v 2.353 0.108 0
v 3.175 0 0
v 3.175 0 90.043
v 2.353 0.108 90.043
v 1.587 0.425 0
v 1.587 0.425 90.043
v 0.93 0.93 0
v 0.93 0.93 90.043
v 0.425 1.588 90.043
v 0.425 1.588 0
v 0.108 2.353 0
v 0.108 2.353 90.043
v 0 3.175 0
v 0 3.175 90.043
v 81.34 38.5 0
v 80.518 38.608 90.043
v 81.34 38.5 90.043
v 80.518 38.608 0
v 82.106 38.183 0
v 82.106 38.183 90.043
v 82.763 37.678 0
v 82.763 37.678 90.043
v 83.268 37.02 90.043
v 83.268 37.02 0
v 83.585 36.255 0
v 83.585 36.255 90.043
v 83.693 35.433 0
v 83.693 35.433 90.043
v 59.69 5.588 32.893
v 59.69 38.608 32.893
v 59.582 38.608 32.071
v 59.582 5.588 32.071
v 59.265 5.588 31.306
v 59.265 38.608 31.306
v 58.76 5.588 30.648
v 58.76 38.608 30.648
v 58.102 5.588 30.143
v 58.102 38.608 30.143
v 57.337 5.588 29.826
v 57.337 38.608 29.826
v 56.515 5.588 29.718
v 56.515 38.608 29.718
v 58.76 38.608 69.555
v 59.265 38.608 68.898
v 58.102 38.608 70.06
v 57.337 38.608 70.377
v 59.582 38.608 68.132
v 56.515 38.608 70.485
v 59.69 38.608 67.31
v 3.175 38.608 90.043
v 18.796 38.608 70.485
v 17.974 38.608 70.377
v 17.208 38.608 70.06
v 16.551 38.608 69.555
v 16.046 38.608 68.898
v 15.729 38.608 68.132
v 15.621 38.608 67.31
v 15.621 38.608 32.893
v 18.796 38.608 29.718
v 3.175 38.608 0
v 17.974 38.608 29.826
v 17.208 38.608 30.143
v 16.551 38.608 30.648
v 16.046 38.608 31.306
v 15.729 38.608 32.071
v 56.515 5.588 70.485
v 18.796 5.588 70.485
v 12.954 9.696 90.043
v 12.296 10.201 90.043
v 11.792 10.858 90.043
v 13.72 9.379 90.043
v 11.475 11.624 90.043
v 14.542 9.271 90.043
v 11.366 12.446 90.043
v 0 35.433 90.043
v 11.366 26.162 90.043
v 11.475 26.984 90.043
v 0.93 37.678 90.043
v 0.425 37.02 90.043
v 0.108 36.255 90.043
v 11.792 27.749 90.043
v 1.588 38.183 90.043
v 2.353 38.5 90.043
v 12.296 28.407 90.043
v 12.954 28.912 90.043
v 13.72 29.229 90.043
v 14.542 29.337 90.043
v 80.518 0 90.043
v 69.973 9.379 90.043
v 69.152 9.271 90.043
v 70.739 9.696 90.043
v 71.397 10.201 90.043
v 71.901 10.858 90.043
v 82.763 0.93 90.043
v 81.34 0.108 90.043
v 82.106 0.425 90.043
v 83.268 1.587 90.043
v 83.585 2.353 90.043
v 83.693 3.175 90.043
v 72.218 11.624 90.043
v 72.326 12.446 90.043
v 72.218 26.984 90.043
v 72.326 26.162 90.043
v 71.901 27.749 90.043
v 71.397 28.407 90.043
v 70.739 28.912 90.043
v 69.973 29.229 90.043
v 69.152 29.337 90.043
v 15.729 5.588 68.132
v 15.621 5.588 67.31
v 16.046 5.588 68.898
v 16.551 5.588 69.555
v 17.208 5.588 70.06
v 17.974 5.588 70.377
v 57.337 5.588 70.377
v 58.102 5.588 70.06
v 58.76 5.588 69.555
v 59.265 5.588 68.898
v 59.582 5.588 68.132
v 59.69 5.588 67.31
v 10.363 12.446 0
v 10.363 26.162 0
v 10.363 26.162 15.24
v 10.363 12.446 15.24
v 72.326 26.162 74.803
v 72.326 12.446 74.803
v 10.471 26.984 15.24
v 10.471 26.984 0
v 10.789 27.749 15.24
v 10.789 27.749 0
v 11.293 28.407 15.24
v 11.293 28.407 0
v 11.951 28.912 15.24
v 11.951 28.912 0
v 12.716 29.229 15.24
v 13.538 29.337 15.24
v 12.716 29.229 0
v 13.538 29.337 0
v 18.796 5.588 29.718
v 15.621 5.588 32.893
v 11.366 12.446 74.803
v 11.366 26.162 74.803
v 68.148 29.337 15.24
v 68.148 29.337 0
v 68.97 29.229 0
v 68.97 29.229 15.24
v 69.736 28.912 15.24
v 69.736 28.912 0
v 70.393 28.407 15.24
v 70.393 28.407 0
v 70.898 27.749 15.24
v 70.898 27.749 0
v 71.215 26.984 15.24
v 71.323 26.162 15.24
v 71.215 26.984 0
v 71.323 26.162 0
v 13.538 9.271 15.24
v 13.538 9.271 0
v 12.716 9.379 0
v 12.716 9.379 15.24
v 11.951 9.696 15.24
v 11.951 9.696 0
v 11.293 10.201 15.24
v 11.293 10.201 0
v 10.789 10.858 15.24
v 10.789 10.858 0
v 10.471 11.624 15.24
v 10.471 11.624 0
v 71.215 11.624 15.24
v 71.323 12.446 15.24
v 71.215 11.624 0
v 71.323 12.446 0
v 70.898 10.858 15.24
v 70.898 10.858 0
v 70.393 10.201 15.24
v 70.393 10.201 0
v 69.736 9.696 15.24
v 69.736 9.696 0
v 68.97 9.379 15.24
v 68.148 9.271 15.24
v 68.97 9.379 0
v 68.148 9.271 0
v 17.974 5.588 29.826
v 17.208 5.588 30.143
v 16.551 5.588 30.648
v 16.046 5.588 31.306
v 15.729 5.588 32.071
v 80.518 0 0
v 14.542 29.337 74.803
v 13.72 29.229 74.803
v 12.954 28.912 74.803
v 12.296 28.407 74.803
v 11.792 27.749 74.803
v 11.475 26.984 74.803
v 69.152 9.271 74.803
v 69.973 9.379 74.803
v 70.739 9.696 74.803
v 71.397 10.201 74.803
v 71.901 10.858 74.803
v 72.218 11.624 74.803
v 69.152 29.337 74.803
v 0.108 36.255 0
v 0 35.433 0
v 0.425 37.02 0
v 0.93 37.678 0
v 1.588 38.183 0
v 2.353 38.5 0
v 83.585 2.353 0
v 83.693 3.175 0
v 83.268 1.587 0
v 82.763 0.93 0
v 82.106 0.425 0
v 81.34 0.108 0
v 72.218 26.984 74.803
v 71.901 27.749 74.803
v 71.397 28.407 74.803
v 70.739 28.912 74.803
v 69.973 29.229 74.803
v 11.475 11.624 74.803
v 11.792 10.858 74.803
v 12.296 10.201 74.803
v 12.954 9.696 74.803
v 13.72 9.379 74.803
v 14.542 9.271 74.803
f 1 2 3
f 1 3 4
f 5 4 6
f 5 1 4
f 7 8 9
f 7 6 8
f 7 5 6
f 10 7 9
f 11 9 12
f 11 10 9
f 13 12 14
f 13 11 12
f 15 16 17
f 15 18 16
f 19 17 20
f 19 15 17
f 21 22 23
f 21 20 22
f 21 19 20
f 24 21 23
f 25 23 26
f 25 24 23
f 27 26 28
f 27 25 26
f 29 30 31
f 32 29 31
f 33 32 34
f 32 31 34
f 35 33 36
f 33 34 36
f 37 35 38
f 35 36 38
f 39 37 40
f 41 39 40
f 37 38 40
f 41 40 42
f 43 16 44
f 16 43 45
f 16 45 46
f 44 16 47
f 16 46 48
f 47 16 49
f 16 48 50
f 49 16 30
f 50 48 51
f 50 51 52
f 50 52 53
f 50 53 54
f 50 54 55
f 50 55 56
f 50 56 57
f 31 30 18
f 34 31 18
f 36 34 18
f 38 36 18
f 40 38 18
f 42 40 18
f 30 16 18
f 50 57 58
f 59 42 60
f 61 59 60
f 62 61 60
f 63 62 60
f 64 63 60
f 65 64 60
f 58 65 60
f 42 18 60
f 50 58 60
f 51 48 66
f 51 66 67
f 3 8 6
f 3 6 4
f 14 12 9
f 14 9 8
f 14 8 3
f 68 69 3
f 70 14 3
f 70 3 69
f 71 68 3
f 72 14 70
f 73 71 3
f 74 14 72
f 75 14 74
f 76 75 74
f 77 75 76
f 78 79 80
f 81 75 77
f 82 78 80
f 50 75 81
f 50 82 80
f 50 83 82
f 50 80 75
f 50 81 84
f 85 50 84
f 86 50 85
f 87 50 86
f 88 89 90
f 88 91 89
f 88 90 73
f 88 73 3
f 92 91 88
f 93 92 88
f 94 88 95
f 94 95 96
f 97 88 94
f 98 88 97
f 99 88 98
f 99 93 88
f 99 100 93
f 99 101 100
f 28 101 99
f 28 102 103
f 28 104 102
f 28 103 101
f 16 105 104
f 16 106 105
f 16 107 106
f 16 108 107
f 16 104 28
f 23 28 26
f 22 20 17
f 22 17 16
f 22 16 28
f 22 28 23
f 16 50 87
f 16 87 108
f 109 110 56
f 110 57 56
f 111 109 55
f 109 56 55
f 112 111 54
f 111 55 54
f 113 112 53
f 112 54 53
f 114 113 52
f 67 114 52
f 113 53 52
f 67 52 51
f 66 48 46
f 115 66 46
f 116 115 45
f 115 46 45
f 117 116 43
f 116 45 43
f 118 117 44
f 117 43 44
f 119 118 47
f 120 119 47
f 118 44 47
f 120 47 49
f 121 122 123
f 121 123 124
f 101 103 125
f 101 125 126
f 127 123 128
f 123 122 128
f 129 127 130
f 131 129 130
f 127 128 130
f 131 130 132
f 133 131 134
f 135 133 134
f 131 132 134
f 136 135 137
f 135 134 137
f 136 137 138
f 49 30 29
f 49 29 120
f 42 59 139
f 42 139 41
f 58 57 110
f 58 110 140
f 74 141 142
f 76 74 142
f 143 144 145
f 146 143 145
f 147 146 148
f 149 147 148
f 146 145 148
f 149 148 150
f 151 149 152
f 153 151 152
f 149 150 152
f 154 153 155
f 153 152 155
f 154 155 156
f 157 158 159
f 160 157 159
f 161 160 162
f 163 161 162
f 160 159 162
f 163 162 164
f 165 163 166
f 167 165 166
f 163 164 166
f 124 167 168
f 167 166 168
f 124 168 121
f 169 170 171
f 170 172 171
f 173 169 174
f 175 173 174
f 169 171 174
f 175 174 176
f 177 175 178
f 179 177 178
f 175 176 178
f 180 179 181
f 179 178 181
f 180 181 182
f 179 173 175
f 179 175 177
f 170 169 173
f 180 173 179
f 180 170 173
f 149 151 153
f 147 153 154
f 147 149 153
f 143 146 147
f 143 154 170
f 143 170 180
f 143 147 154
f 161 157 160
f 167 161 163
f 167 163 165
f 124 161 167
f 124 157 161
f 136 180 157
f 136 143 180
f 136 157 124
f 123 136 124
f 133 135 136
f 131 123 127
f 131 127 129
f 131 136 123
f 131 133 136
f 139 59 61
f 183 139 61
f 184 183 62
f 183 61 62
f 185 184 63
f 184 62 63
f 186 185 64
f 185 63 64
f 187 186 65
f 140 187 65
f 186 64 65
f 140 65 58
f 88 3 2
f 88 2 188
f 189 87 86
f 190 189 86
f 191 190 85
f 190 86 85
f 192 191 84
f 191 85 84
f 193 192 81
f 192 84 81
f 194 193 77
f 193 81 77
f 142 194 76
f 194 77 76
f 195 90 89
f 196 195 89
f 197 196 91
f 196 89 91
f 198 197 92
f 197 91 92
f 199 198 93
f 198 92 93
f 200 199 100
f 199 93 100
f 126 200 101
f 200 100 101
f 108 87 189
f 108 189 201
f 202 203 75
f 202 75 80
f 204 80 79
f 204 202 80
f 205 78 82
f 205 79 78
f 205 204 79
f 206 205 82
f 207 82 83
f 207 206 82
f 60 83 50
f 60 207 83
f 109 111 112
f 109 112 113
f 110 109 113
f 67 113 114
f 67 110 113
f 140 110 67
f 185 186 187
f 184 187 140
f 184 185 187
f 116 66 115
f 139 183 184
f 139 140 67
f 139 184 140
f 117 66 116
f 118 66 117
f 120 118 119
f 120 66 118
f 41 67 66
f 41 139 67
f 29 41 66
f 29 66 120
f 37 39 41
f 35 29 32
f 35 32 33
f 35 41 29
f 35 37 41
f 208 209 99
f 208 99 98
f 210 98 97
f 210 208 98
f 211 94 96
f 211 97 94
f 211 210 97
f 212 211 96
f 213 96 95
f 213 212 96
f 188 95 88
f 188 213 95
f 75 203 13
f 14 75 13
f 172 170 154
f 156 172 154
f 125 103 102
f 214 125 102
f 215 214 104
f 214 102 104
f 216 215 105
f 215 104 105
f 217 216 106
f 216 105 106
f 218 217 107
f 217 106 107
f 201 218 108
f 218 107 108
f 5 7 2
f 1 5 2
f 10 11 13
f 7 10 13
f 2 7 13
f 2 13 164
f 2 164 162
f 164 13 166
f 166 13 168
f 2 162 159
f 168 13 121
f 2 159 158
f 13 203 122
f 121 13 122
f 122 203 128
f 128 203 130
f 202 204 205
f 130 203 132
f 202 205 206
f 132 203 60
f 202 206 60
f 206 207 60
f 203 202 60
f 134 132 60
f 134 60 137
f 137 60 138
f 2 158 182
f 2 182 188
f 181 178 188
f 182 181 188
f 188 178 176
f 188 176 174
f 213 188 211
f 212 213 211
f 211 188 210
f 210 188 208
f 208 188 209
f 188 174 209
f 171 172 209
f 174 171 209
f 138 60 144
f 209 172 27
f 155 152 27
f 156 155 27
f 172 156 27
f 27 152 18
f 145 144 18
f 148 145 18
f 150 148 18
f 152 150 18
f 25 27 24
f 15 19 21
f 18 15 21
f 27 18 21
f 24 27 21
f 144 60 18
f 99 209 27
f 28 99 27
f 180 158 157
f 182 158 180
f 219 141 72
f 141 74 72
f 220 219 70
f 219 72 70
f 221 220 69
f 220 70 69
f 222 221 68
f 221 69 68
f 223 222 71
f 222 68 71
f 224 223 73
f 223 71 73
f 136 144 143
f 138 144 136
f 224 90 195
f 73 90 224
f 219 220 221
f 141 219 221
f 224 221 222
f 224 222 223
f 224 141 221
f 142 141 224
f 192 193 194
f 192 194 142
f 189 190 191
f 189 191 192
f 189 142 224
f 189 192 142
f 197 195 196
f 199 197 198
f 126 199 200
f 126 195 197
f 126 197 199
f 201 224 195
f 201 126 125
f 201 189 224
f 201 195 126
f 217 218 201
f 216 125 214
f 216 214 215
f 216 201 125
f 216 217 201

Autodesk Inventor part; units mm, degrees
ref_plane "YZ Plane" through (0, 0, 0) normal (1, 0, 0) x (0, 1, 0)
ref_plane "XZ Plane" through (0, 0, 0) normal (0, 1, 0) x (-1, 0, 0)
ref_plane "XY Plane" through (0, 0, 0) normal (0, 0, 1) x (1, 0, 0)
sketch "Sketch1" plane through (0, 0, 0) normal (0, 0, 1) x (1, 0, 0)
  line L0 (3.175, 0) -> (80.518, 0)
  line L1 (83.693, 3.175) -> (83.693, 35.433)
  line L2 (80.518, 38.608) -> (3.175, 38.608)
  line L3 (0, 35.433) -> (0, 3.175)
  arc A0 (3.175, 38.608) -> (0, 35.433) centre (3.175, 35.433) ccw
  arc A1 (0, 3.175) -> (3.175, 0) centre (3.175, 3.175) ccw
  arc A2 (80.518, 0) -> (83.693, 3.175) centre (80.518, 3.175) ccw
  arc A3 (83.693, 35.433) -> (80.518, 38.608) centre (80.518, 35.433) ccw
  point P0 (0, 0)
  point P1 (83.693, 38.608)
  point P2 (83.693, 0)
  point P3 (0, 38.608)
  dimension "d0" = 83.693
  dimension "d1" = 38.608
  dimension "d2" = 3.175
extrude "Extrusion1" add sketch "Sketch1" along normal blind 90.043
sketch "Sketch2" plane through (3.175, 38.608, 0) normal (0, 1, 0) x (1, 0, 0)
  line L0 (0, 0) -> (77.343, 0) projected
  line L1 (12.4957, 0) -> (42.2137, 0) construction
  line L2 (0, 0) -> (0, -90.043) projected
  line L3 (77.343, -90.043) -> (0, -90.043) projected
  line L4 (77.343, 0) -> (77.343, -90.043) projected
  line L5 (0, 0) -> (77.343, 0) projected
  line L6 (0, 0) -> (-3.175, 0) projected
  line L7 (80.518, 0) -> (77.343, 0) projected
  line L8 (-3.175, -90.043) -> (0, -90.043) projected
  line L9 (77.343, -90.043) -> (80.518, -90.043) projected
  line L10 (-3.175, 0) -> (-3.175, -90.043) projected
  line L11 (15.621, -29.718) -> (53.34, -29.718)
  line L12 (56.515, -32.893) -> (56.515, -67.31)
  line L13 (53.34, -70.485) -> (15.621, -70.485)
  line L14 (12.446, -67.31) -> (12.446, -32.893)
  arc A0 (15.621, -29.718) -> (12.446, -32.893) centre (15.621, -32.893) ccw
  arc A1 (56.515, -32.893) -> (53.34, -29.718) centre (53.34, -32.893) ccw
  arc A2 (53.34, -70.485) -> (56.515, -67.31) centre (53.34, -67.31) ccw
  arc A3 (12.446, -67.31) -> (15.621, -70.485) centre (15.621, -67.31) ccw
  point P0 (56.515, -70.485)
  point P1 (56.515, -29.718)
  point P2 (12.446, -70.485)
  dimension "d9" = 44.069
  dimension "d10" = 40.767
  dimension "d11" = 15.621
  dimension "d12" = 29.718
  dimension "d13" = 3.175
extrude "Extrusion2" cut sketch "Sketch2" against normal blind 33.02 contours L11 A1 L12 A2 L13 A3 L14 A0
sketch "Sketch3" plane through (0, 0, 90.043) normal (0, 0, 1) x (1, 0, 0)
  line L0 (80.518, 38.608) -> (3.175, 38.608) projected
  line L1 (11.684, 38.608) -> (20.955, 38.608) construction
  line L2 (14.5415, 29.337) -> (69.1515, 29.337)
  line L3 (72.3265, 26.162) -> (72.3265, 12.446)
  line L4 (69.1515, 9.271) -> (14.5415, 9.271)
  line L5 (11.3665, 12.446) -> (11.3665, 26.162)
  arc A0 (14.5415, 29.337) -> (11.3665, 26.162) centre (14.5415, 26.162) ccw
  arc A1 (72.3265, 26.162) -> (69.1515, 29.337) centre (69.1515, 26.162) ccw
  arc A2 (69.1515, 9.271) -> (72.3265, 12.446) centre (69.1515, 12.446) ccw
  arc A3 (11.3665, 12.446) -> (14.5415, 9.271) centre (14.5415, 12.446) ccw
  line L6 (83.693, 3.175) -> (83.693, 35.433) projected
  line L7 (0, 35.433) -> (0, 3.175) projected
  line L8 (3.175, 0) -> (80.518, 0) projected
  point P0 (0, 0)
  point P1 (72.3265, 9.271)
  point P2 (72.3265, 29.337)
  point P3 (11.3665, 9.271)
  dimension "d19" = 60.96
  dimension "d20" = 20.066
  dimension "d21" = 3.175
  dimension "d24" = 11.3665
  dimension "d25" = 9.271
extrude "Extrusion3" cut sketch "Sketch3" against normal blind 15.24
sketch "Sketch4" plane through (0, 0, 0) normal (0, 0, -1) x (-1, 0, 0)
  line L0 (-68.1482, 29.337) -> (-13.5382, 29.337)
  line L1 (-10.3632, 26.162) -> (-10.3632, 12.446)
  line L2 (-13.5382, 9.271) -> (-68.1482, 9.271)
  line L3 (-71.3232, 12.446) -> (-71.3232, 26.162)
  arc A0 (-68.1482, 29.337) -> (-71.3232, 26.162) centre (-68.1482, 26.162) ccw
  arc A1 (-10.3632, 26.162) -> (-13.5382, 29.337) centre (-13.5382, 26.162) ccw
  arc A2 (-13.5382, 9.271) -> (-10.3632, 12.446) centre (-13.5382, 12.446) ccw
  arc A3 (-71.3232, 12.446) -> (-68.1482, 9.271) centre (-68.1482, 12.446) ccw
  line L4 (-3.175, 38.608) -> (-80.518, 38.608) projected
  arc A4 (-80.518, 38.608) -> (-83.693, 35.433) centre (-80.518, 35.433) ccw projected
  line L5 (-83.693, 35.433) -> (-83.693, 3.175) projected
  arc A5 (-83.693, 3.175) -> (-80.518, 0) centre (-80.518, 3.175) ccw projected
  line L6 (-80.518, 0) -> (-3.175, 0) projected
  arc A6 (-3.175, 0) -> (0, 3.175) centre (-3.175, 3.175) ccw projected
  line L7 (0, 3.175) -> (0, 35.433) projected
  arc A7 (0, 35.433) -> (-3.175, 38.608) centre (-3.175, 35.433) ccw projected
  point P0 (0, 0)
  point P1 (-10.3632, 9.271)
  point P2 (-10.3632, 29.337)
  point P3 (-71.3232, 9.271)
  dimension "d28" = 60.96
  dimension "d29" = 20.066
  dimension "d30" = 3.175
  dimension "d31" = 10.3632
  dimension "d32" = 9.271
extrude "Extrusion5" cut sketch "Sketch4" against normal blind 15.24 contours L0 A1 L1 A2 L2 A3 L3 A0
properties part number "Middle Body"
